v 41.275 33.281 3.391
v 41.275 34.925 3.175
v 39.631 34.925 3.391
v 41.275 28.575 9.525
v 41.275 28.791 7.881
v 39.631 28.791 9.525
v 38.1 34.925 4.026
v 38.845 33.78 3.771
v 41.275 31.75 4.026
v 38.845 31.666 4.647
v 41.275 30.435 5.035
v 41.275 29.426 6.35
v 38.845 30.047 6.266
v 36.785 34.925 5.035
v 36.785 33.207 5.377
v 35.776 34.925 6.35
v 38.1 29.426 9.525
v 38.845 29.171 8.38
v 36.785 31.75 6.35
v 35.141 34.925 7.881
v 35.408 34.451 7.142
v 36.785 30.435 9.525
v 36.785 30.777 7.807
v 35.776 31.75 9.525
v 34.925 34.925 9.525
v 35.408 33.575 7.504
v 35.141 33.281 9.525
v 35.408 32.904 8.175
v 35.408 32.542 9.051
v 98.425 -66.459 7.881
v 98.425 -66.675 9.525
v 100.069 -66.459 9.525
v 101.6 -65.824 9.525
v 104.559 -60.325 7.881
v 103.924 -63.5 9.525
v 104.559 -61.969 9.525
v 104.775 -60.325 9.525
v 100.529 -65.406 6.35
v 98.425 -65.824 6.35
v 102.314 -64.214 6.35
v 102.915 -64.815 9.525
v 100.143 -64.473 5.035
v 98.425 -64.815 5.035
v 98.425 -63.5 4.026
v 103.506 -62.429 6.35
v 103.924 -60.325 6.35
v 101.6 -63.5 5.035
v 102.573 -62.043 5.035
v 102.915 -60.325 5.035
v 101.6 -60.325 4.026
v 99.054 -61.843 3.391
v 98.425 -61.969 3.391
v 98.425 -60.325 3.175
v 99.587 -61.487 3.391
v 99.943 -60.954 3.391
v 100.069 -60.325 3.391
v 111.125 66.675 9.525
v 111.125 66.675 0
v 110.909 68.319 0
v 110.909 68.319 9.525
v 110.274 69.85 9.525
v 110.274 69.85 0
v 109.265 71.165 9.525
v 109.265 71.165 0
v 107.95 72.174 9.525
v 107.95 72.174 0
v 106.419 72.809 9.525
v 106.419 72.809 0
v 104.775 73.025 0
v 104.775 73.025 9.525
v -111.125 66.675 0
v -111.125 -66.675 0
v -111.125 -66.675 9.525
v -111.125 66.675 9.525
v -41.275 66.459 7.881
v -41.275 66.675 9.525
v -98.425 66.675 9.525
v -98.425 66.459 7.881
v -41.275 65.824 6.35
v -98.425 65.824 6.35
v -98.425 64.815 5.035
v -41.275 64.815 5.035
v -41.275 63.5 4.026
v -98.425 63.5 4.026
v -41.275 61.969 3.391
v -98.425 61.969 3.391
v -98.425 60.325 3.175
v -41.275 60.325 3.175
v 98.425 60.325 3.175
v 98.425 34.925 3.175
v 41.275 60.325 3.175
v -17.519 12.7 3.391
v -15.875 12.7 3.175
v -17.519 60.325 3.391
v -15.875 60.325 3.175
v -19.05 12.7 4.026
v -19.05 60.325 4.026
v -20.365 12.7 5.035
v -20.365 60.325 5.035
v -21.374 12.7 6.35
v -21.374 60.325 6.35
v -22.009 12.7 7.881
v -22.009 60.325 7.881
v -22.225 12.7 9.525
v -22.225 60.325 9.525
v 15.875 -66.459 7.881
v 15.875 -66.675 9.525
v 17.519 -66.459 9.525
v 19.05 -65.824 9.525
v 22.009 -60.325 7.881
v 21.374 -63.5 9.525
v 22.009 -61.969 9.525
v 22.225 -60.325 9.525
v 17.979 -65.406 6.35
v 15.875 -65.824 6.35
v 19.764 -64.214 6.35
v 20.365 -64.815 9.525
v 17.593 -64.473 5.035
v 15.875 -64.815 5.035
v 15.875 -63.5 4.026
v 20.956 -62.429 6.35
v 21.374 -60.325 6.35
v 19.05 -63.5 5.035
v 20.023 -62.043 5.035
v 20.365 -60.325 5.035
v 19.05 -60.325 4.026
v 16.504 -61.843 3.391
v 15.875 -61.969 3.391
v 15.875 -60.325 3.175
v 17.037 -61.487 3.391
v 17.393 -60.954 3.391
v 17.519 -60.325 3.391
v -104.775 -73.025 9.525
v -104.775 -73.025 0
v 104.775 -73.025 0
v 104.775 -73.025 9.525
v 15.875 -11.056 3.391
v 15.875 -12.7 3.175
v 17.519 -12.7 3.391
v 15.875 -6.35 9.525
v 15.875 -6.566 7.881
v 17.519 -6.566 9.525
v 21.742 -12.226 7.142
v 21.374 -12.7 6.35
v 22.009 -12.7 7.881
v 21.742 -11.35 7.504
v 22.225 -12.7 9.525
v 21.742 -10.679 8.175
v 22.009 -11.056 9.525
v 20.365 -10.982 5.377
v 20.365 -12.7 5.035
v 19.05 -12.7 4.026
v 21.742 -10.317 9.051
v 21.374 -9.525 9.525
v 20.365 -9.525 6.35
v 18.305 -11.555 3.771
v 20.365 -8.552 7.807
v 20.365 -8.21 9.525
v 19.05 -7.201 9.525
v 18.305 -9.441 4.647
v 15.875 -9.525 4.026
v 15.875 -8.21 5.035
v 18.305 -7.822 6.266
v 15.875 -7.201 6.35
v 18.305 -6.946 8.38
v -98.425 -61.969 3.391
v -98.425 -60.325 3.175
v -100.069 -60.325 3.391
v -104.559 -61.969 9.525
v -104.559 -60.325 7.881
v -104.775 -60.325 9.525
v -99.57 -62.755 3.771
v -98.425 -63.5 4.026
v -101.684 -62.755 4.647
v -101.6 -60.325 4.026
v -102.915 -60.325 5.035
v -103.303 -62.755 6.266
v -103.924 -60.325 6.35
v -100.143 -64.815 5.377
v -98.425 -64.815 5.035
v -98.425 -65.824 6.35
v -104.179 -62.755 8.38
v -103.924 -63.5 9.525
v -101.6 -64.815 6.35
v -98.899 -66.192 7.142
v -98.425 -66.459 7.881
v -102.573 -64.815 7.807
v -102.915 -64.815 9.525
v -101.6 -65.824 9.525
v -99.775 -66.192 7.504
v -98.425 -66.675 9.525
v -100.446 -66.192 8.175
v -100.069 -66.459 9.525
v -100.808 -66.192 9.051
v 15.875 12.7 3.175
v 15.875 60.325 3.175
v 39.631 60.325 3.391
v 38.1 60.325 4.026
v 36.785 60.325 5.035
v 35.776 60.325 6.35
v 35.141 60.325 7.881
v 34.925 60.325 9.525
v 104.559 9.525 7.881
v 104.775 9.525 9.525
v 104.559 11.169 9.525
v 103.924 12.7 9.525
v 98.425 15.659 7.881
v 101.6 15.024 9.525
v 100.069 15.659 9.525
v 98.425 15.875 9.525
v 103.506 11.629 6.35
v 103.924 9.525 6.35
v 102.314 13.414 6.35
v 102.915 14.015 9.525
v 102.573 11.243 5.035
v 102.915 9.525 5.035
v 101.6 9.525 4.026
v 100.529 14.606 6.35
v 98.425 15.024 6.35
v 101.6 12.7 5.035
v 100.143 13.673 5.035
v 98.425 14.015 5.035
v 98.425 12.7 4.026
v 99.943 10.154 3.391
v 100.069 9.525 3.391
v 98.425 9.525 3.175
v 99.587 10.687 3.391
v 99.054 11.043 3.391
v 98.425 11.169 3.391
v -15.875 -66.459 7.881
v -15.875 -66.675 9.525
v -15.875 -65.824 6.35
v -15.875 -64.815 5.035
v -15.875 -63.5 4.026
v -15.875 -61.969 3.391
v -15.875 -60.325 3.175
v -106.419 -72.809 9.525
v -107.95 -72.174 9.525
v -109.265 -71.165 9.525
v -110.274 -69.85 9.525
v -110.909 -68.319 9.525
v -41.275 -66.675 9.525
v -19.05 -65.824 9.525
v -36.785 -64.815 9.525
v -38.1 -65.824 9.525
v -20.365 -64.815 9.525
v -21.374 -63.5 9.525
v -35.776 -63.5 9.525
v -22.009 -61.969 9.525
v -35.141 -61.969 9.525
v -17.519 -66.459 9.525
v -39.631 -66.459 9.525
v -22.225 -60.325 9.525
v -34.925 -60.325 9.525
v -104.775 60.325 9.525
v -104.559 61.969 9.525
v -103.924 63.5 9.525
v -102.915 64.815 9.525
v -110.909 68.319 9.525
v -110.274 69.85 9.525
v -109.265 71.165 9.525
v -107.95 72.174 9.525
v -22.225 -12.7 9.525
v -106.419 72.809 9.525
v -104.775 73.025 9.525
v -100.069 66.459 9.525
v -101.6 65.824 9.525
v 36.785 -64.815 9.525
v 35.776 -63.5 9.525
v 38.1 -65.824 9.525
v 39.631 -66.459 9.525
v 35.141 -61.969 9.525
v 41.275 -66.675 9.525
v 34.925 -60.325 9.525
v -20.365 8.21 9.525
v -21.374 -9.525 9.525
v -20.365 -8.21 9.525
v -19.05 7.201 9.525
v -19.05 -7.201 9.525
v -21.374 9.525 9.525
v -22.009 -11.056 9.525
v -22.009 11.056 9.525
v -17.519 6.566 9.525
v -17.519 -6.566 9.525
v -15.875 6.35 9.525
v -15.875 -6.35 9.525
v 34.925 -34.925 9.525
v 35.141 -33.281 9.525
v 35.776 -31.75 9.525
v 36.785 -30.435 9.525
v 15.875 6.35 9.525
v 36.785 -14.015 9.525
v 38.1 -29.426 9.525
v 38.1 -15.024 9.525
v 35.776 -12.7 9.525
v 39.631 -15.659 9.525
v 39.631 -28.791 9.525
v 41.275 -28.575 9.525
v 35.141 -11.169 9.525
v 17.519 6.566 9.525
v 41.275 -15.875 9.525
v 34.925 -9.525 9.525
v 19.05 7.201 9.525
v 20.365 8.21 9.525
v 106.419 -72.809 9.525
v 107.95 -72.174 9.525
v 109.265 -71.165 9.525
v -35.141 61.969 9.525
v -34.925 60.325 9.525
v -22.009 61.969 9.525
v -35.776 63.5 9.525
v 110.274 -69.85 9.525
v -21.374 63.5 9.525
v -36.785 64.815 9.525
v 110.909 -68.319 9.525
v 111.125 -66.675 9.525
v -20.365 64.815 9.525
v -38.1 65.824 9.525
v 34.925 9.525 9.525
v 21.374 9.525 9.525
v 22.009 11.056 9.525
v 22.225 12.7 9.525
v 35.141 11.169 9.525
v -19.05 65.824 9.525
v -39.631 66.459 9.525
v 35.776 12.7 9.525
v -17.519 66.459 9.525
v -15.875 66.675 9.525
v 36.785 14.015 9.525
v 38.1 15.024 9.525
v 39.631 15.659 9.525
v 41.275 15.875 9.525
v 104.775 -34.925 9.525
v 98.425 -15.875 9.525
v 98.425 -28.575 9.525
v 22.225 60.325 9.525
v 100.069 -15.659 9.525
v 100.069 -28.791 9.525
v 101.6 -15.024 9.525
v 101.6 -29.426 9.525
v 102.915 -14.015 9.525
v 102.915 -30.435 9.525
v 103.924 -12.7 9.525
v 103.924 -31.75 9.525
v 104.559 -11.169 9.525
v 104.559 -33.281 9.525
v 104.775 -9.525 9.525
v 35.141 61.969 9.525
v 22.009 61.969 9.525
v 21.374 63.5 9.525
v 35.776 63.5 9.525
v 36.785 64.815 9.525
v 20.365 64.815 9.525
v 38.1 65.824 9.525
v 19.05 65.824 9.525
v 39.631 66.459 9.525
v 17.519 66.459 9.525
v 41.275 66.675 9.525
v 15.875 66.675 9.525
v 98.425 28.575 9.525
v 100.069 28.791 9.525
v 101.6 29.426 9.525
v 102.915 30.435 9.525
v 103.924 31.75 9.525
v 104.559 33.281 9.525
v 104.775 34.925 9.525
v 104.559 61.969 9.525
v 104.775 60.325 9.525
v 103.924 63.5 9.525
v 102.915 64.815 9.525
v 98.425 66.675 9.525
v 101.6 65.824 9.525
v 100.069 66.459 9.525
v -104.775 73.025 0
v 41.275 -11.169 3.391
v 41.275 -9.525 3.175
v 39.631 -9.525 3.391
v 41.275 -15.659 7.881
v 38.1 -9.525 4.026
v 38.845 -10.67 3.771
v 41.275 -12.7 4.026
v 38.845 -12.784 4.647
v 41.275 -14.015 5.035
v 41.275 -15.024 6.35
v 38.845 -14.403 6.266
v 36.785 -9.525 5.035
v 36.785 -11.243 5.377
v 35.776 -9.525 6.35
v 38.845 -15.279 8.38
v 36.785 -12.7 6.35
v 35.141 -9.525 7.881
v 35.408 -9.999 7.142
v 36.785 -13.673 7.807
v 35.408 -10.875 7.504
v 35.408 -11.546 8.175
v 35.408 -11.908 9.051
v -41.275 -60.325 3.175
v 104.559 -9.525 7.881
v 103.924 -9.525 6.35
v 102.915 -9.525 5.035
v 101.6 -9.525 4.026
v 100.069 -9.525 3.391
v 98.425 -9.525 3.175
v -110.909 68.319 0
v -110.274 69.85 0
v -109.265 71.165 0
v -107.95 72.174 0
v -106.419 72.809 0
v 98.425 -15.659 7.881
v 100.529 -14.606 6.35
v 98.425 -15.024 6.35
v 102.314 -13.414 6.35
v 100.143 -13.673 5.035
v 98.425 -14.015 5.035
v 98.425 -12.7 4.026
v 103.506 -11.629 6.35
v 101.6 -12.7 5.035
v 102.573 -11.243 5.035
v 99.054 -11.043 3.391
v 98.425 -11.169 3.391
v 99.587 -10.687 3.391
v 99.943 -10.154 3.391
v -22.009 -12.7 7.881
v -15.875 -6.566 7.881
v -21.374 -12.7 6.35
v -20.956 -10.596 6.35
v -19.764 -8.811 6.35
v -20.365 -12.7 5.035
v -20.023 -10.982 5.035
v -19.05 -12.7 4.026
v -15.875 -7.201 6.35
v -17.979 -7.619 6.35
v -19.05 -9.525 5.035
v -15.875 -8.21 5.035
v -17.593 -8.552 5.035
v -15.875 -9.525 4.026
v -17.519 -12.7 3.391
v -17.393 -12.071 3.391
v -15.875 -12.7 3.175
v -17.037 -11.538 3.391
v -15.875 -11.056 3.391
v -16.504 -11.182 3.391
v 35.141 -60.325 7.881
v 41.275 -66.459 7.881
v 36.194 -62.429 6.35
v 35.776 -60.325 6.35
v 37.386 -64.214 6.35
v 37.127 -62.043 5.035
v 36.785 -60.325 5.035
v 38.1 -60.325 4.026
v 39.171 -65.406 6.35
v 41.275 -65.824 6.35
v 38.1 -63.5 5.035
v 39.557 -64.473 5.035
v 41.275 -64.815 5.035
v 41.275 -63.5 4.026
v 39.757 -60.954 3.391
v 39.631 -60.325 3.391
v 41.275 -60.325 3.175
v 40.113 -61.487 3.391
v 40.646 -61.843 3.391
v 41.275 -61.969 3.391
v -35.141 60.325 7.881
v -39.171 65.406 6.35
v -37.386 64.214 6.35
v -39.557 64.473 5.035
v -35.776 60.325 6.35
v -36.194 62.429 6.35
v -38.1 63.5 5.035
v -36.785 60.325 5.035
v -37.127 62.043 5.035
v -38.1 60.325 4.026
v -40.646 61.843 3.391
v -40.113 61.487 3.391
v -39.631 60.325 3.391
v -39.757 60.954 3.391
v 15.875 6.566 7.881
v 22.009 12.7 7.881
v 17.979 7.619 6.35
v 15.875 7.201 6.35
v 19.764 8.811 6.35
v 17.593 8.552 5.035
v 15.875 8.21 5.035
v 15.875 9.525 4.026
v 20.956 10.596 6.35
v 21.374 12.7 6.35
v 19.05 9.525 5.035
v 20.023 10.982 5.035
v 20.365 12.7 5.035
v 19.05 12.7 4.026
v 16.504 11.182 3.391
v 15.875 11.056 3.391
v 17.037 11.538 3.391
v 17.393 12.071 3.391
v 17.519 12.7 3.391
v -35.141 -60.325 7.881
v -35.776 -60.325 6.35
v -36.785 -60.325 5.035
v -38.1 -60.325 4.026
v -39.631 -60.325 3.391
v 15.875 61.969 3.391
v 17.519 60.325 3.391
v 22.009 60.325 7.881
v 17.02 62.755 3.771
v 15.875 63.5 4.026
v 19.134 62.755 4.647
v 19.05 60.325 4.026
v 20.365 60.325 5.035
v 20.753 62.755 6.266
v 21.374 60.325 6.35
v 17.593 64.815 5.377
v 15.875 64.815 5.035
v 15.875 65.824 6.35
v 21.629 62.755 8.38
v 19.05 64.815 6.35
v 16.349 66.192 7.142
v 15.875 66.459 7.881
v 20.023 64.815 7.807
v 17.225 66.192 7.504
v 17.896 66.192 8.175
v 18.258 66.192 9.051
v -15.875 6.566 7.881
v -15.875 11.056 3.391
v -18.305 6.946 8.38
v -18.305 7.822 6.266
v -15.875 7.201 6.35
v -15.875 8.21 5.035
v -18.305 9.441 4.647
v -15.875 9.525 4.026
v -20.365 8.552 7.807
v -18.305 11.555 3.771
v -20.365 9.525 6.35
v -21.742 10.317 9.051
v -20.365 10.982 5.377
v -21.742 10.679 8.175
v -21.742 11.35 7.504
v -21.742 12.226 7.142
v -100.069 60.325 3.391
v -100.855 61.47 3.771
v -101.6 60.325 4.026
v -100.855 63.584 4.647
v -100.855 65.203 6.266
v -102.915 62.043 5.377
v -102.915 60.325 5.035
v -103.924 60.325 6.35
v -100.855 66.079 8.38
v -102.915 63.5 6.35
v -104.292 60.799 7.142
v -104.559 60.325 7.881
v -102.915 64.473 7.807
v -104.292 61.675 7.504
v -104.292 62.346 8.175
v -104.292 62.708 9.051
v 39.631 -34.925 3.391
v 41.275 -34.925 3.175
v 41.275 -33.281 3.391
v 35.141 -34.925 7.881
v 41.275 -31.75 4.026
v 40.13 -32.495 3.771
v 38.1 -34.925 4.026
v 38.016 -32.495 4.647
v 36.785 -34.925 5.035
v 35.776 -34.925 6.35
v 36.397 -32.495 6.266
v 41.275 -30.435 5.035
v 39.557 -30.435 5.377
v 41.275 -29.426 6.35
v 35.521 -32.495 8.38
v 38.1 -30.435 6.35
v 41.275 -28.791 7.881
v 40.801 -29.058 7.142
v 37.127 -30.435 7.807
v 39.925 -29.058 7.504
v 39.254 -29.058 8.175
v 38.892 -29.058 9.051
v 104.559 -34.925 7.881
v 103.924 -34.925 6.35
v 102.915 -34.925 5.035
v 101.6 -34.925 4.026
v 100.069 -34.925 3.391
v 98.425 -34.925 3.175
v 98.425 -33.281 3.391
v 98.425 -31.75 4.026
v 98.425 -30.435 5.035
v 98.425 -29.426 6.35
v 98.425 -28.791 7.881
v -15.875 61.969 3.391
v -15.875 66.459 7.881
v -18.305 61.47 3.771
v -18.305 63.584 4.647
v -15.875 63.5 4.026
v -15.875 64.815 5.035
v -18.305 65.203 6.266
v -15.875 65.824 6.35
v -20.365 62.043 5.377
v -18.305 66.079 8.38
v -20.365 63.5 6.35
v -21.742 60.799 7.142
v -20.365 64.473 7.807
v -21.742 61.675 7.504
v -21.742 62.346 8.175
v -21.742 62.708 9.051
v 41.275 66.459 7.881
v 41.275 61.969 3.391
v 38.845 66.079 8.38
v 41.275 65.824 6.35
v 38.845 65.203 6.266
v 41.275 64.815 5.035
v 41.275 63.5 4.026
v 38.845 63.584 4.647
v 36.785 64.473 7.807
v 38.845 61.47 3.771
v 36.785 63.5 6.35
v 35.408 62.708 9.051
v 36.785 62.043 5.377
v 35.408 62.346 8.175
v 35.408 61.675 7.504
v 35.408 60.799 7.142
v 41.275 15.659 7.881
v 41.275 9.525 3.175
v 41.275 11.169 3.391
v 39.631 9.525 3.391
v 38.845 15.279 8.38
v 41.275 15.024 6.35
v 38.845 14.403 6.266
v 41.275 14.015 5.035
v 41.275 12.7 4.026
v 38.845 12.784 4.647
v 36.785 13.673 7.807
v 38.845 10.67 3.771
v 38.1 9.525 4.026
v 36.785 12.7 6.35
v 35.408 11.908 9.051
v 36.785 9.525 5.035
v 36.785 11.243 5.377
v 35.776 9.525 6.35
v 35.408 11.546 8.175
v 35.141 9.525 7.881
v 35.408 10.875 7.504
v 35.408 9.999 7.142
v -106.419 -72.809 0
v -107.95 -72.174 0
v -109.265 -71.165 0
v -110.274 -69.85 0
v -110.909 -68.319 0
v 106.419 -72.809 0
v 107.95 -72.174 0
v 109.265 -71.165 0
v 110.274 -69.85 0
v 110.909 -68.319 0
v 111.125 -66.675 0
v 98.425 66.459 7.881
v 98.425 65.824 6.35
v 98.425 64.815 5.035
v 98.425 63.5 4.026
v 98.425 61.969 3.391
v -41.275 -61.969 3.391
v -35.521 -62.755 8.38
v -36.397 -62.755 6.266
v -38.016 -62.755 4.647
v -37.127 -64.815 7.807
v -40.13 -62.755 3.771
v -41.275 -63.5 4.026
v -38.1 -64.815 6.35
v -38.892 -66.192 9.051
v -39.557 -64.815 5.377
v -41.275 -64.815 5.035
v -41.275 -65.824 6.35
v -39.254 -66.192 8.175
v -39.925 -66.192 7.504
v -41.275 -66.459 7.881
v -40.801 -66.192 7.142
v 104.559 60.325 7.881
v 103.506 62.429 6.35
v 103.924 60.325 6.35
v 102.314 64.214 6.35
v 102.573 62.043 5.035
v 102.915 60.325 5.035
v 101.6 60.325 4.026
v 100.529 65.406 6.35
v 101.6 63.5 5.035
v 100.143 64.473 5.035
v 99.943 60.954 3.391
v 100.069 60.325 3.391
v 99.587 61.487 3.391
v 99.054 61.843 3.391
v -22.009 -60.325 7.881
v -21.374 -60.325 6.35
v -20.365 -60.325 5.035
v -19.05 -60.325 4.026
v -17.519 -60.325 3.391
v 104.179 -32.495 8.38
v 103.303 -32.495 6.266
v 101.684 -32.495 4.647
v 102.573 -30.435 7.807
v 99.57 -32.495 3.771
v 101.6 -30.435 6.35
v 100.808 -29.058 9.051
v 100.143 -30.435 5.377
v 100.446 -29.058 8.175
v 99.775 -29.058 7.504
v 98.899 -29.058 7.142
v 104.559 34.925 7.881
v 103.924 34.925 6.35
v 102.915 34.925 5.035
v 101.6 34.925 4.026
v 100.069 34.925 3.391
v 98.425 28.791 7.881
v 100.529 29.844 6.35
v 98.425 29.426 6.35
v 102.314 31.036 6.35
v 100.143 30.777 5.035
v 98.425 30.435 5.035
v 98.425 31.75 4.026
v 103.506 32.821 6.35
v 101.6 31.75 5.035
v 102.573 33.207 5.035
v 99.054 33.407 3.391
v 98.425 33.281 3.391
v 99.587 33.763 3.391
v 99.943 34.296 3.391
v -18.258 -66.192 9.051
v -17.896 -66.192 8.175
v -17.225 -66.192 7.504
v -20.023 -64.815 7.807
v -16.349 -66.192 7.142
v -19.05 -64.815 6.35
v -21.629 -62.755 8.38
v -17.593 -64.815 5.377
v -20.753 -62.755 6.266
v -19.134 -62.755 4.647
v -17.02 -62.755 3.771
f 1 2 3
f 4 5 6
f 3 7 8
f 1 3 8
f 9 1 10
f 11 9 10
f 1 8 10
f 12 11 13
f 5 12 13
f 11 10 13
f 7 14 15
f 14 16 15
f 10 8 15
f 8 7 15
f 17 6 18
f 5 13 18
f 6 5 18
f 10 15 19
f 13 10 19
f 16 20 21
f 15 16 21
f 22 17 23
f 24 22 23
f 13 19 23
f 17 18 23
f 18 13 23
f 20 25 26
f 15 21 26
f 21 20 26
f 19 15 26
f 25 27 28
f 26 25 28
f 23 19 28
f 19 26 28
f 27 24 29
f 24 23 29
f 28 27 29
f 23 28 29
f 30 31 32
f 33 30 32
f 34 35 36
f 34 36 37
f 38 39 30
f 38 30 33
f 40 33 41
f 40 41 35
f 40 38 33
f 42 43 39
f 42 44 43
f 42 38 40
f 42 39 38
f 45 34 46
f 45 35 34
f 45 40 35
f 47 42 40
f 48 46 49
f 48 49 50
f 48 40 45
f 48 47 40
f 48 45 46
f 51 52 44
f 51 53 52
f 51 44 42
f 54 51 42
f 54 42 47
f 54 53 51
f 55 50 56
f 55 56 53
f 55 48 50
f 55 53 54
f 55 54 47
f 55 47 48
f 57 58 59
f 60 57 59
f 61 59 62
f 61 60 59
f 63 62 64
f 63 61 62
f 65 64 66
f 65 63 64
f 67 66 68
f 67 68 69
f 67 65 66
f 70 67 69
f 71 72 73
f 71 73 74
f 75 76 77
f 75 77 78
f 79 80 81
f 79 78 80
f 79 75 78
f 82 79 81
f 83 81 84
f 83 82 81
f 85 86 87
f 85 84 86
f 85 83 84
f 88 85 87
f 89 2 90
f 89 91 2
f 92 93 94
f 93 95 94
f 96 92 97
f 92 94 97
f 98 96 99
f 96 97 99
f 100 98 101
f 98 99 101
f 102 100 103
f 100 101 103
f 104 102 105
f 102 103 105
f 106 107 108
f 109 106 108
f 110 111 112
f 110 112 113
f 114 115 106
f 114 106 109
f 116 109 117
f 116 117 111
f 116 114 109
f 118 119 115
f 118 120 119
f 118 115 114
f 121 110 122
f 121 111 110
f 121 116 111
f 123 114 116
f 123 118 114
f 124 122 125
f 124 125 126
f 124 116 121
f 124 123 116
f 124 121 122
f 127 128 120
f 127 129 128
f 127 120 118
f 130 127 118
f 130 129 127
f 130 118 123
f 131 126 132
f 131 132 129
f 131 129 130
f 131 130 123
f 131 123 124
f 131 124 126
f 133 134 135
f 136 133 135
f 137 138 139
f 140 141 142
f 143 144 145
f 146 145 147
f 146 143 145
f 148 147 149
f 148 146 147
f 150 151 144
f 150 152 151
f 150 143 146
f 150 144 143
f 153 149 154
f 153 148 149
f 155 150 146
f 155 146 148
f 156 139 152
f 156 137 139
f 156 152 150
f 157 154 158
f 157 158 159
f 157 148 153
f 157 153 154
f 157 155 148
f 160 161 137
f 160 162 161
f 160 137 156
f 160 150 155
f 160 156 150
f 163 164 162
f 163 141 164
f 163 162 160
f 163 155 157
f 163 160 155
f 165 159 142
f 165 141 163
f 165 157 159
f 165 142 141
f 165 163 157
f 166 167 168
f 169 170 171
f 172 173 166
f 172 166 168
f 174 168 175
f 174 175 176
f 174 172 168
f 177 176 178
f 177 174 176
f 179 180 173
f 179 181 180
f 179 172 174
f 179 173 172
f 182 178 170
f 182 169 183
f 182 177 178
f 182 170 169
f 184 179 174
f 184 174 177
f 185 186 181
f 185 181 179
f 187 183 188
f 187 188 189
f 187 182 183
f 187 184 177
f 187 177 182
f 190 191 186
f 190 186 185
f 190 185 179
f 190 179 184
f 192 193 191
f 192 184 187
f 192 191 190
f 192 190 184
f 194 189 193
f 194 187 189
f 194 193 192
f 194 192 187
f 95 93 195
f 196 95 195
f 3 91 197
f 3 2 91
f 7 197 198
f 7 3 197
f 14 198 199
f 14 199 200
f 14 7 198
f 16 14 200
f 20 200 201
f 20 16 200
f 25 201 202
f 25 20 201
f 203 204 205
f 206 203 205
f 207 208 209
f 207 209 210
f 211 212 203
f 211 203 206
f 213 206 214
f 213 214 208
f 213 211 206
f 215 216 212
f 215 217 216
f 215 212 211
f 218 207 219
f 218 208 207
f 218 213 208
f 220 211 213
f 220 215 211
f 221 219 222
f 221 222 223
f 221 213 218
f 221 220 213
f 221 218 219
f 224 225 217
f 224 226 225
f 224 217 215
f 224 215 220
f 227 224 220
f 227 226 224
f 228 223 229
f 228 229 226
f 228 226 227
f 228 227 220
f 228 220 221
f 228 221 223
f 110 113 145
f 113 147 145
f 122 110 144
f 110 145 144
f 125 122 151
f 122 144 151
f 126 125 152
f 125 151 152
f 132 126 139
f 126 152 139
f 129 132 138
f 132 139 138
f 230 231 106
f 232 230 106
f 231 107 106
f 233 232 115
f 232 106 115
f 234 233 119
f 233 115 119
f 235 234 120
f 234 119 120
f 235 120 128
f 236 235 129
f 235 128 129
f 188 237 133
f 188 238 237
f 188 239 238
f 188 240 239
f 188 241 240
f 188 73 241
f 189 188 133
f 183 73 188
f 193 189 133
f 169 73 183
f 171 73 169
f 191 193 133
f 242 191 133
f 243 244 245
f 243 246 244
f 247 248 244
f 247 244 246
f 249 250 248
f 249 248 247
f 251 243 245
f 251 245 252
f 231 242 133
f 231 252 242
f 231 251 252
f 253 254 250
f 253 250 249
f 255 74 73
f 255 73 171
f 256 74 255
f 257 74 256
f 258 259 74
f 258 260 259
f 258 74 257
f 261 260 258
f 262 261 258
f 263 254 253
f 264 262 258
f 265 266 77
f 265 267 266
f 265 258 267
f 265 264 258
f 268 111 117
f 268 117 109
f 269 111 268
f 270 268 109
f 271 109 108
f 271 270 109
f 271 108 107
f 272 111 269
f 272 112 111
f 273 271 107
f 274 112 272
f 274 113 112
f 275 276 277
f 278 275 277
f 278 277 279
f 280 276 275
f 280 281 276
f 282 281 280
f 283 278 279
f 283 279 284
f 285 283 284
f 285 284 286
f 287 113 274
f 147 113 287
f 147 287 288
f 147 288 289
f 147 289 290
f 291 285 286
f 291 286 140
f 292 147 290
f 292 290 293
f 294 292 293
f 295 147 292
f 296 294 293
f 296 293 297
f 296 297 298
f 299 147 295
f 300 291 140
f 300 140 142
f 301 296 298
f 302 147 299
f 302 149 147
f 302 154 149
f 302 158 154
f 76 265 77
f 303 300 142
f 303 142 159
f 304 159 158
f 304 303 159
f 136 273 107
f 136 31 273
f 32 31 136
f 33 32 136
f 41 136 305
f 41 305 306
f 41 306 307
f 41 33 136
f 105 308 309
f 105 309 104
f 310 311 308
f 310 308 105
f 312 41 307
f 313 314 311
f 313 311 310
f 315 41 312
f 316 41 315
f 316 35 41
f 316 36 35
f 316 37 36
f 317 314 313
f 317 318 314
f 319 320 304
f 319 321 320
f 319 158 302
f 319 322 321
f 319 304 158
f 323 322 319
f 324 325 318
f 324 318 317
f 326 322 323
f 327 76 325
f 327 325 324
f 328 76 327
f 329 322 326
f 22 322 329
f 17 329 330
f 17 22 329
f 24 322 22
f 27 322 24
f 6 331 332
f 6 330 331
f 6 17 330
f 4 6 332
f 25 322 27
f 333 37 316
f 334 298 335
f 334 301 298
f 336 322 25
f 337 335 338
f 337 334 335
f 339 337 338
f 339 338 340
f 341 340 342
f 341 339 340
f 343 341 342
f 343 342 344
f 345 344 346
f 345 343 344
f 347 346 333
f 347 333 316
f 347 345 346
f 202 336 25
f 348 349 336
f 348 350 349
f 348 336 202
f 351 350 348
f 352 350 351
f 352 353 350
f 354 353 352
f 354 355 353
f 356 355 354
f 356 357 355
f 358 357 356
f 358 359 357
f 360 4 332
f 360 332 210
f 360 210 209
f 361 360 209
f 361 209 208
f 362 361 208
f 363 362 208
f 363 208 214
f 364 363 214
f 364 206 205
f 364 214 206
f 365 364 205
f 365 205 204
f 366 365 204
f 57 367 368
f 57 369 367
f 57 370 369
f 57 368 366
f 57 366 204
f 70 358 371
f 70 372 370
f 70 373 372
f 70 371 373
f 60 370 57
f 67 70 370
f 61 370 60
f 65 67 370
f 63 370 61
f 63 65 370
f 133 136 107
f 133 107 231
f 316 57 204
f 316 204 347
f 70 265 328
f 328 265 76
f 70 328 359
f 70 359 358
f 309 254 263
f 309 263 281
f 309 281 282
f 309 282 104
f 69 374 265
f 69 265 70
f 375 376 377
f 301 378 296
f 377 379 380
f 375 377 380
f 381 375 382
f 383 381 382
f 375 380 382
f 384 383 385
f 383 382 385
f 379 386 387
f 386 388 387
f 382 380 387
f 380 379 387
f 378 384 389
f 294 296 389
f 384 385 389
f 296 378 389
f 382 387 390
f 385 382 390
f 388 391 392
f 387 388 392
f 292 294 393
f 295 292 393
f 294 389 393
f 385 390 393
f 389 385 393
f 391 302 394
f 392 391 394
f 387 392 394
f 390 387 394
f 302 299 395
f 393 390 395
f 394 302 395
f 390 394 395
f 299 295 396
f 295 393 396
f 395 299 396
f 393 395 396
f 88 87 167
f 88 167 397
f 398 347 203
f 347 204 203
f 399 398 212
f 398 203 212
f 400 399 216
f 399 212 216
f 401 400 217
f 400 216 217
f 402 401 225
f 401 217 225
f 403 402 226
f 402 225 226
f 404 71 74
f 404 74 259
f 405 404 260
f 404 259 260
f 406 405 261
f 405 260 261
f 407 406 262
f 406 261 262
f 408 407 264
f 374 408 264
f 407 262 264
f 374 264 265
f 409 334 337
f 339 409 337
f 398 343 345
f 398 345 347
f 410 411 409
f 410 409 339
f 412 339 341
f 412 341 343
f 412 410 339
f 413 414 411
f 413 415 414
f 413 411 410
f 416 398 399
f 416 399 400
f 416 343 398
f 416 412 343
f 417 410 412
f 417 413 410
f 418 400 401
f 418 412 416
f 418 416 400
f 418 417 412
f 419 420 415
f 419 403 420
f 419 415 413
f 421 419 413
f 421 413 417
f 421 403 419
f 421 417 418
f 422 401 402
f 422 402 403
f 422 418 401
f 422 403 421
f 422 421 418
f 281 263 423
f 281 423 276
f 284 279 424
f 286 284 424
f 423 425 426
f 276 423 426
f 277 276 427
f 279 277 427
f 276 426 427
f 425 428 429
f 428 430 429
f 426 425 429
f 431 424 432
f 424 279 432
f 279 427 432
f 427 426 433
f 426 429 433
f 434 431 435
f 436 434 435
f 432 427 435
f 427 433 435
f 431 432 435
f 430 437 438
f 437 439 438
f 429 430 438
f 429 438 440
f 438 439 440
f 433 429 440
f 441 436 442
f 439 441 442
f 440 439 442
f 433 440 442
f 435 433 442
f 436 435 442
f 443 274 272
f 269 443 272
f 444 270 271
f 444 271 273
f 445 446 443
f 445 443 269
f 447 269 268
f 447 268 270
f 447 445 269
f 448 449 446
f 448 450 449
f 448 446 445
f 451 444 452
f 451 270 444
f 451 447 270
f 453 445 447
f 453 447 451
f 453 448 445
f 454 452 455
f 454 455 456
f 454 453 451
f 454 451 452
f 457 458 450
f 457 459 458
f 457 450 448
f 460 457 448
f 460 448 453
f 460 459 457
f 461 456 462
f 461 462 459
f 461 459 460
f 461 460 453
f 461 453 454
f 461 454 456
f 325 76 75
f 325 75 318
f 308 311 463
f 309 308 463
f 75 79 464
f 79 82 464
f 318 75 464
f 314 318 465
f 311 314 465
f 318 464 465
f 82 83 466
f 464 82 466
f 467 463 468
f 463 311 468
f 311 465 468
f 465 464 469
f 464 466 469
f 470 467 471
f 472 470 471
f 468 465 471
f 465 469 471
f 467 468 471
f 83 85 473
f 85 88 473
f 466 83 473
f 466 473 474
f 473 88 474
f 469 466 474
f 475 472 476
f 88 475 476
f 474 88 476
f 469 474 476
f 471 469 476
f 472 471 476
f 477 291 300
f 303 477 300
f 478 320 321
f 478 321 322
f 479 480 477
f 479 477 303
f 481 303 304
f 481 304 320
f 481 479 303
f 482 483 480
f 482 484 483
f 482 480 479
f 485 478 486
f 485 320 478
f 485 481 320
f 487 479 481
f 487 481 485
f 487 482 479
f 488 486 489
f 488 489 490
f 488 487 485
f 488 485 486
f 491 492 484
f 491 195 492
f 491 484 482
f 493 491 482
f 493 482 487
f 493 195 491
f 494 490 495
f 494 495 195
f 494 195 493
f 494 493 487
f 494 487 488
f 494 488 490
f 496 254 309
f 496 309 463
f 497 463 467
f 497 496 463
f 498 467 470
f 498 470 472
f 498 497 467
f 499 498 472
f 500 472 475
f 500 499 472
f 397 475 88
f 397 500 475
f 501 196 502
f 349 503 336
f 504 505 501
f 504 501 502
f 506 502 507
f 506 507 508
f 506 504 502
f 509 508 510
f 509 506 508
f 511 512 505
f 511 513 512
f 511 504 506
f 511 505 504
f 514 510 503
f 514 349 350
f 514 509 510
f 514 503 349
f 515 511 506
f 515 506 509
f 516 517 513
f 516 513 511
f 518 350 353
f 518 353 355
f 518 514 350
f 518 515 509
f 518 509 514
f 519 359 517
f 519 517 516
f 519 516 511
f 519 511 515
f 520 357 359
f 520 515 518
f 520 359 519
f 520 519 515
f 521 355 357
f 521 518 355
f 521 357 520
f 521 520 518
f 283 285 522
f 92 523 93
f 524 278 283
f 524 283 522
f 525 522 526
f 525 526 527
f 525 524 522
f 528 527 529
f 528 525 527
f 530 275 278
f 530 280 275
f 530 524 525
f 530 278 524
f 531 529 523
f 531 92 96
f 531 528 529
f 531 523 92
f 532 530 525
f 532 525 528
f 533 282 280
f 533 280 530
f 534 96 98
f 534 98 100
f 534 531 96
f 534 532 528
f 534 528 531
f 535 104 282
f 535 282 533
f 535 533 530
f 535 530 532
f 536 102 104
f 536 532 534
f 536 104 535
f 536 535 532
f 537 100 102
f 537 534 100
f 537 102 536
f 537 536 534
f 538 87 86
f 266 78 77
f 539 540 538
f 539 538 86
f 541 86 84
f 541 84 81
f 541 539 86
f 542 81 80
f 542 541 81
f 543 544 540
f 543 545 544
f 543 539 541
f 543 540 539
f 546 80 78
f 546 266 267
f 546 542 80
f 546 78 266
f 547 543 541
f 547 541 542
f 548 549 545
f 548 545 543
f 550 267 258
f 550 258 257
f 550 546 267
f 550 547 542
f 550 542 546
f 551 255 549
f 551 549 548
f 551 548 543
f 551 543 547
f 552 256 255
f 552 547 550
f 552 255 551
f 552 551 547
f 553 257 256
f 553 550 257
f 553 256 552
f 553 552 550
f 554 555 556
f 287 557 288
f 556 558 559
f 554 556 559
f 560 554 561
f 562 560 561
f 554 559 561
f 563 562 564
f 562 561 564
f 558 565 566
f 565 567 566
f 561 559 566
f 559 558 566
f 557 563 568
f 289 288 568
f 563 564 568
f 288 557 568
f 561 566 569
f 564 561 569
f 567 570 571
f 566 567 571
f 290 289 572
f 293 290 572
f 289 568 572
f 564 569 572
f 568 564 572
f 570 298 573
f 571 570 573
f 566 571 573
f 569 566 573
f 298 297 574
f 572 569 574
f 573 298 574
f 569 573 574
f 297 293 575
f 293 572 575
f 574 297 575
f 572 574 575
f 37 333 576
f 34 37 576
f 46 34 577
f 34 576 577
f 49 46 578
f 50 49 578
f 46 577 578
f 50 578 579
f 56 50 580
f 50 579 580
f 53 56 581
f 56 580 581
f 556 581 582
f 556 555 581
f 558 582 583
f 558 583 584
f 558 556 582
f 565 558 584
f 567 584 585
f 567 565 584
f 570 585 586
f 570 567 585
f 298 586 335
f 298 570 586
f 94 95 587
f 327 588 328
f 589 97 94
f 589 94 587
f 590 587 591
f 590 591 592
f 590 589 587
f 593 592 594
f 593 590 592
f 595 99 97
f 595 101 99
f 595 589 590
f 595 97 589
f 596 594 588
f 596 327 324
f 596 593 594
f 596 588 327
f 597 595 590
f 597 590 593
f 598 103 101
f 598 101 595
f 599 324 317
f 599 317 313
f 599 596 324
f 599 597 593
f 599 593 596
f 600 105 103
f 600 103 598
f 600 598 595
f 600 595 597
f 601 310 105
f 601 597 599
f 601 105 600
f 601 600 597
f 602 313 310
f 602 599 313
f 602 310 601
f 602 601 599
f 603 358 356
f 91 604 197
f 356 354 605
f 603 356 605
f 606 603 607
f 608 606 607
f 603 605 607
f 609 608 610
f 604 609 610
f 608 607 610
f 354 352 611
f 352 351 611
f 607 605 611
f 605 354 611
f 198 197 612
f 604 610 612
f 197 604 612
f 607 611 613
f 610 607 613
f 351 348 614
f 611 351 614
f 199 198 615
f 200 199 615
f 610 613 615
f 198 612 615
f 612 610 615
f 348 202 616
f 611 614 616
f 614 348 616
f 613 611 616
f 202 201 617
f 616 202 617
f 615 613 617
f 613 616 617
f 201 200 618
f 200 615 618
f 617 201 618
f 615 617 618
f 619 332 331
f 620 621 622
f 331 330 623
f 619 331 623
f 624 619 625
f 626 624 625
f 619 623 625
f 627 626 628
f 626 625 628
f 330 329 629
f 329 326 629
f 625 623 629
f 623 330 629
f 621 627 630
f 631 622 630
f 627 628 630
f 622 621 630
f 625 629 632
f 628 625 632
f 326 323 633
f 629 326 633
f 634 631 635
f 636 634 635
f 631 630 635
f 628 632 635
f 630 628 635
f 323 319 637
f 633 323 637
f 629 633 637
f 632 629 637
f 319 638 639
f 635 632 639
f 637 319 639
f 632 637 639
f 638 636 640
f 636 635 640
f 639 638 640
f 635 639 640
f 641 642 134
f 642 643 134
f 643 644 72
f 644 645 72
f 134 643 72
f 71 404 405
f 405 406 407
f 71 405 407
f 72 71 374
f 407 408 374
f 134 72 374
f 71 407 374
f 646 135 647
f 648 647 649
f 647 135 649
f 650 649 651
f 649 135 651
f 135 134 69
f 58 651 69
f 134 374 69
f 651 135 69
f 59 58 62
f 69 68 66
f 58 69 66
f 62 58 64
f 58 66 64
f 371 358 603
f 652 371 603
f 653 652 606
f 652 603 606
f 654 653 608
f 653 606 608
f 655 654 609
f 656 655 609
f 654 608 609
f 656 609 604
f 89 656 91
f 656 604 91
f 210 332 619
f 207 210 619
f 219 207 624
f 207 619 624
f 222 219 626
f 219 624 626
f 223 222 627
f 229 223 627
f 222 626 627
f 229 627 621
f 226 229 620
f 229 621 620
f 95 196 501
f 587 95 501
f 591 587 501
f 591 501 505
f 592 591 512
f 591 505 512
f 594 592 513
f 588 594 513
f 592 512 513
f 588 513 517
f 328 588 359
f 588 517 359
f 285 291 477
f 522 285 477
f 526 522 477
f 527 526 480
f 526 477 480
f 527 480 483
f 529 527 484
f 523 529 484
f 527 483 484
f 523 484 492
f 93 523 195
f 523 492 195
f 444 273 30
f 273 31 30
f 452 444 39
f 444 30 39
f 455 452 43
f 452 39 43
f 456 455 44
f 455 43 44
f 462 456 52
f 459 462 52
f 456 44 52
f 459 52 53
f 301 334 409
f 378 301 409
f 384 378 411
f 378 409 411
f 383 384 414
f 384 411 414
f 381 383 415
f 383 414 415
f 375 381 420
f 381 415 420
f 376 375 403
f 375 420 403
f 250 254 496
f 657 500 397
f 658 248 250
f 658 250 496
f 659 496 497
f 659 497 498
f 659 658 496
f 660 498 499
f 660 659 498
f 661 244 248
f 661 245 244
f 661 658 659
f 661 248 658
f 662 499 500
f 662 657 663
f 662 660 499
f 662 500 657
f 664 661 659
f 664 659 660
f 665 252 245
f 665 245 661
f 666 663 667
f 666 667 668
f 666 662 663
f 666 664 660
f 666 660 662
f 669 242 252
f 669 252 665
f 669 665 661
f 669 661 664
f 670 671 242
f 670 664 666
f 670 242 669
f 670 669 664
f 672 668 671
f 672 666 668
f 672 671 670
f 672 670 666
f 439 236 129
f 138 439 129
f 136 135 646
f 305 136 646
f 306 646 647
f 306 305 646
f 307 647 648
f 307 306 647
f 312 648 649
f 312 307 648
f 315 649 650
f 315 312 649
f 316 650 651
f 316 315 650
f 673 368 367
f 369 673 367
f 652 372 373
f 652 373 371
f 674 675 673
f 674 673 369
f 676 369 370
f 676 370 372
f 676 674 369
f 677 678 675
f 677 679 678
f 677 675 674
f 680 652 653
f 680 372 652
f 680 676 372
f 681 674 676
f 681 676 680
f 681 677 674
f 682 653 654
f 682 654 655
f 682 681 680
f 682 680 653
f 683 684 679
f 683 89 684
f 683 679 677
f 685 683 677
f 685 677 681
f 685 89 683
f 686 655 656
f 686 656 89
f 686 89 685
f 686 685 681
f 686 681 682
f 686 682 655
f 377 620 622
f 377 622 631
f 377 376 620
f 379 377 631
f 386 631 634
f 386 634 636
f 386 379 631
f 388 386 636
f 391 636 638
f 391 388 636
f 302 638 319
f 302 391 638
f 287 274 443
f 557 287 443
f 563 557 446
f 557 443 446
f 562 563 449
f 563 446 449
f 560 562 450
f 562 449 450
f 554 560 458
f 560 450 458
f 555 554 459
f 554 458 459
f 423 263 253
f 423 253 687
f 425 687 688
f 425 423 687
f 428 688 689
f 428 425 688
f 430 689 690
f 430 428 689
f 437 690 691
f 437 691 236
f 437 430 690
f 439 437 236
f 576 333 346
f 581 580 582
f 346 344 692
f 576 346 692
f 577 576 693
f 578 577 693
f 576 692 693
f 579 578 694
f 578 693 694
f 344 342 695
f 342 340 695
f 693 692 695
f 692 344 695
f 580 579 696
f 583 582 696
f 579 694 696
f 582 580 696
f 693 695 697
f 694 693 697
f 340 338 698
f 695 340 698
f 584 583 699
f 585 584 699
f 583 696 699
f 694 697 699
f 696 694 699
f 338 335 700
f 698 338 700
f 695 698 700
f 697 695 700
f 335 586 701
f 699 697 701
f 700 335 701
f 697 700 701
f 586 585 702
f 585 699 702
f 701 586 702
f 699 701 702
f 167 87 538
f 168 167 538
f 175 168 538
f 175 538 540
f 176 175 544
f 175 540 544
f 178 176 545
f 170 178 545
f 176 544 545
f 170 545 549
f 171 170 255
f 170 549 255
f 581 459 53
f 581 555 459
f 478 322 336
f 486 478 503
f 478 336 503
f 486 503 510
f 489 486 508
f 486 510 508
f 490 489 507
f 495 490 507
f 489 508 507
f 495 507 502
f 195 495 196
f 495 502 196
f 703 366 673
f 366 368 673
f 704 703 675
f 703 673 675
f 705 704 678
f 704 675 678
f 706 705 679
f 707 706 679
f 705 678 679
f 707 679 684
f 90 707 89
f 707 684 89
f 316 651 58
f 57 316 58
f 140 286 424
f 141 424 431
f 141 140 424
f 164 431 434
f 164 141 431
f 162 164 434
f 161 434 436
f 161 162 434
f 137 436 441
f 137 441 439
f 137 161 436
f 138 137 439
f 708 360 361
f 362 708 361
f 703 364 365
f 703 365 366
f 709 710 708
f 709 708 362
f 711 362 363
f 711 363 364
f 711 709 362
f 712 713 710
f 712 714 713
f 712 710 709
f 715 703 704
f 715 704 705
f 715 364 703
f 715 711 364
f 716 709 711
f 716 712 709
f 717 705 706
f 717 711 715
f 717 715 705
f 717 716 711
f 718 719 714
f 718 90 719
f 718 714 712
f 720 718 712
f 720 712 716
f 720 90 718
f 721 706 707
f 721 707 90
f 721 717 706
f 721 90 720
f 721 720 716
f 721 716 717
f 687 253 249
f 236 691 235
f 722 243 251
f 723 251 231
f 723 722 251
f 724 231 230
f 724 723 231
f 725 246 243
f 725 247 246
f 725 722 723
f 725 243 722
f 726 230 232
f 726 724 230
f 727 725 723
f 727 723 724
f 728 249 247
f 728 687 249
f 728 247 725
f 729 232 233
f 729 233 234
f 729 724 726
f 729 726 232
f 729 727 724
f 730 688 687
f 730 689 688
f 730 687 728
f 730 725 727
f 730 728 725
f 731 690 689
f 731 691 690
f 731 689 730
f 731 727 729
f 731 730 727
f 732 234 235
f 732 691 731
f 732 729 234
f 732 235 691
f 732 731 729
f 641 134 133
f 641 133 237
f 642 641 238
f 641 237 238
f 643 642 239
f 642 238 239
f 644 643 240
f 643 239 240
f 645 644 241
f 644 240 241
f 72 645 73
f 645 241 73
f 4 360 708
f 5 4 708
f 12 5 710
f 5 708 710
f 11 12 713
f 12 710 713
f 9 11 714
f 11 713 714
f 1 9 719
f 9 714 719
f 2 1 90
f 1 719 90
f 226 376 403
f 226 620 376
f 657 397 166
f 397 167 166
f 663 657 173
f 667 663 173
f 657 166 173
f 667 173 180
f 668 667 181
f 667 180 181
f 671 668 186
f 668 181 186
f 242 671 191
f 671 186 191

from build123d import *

# Parameters (mm, degrees)
F0_W     = 222.25
F0_H     = 146.05
F1_DEPTH = 9.525
F2_W     = 69.85
F2_H     = 38.1
F2_H_2   = 133.35
F2_H_3   = 31.75
F2_W_2   = 44.45
F2_H_4   = 60.325
F3_DEPTH = 6.35
F4_F1_R  = 6.35
F4_F2_R  = 6.35
F4_F3_R  = 6.35
F4_F4_R  = 6.35
F4_F5_R  = 6.35
F4_F6_R  = 6.3499
F4_F7_R  = 6.35
F4_F8_R  = 6.3499
F4_F9_R  = 6.35
F4_F10_R = 6.35
F4_F11_R = 6.3499
F4_F12_R = 6.3499
F4_F13_R = 6.35
F4_F14_R = 6.3499
F4_F15_R = 6.3499
F4_F16_R = 6.3499
F4_F17_R = 6.35
F4_F18_R = 6.35
F4_F19_R = 6.3499
F4_F20_R = 6.3499
F4_F21_R = 6.35
F4_F22_R = 6.3499
F4_F23_R = 6.3499
F4_F24_R = 6.3499
F4_F25_R = 6.35
F4_F26_R = 6.35
F4_F27_R = 6.3499
F4_F28_R = 6.3499


# Not quite as in the source:
# - two fillets or chamfers of one size are made in one step
# - a fillet or chamfer is up to 0.001 mm smaller than in the source, because OpenCascade refuses the exact size
# - a feature of the source that left no trace in its solid (it failed there, or was rolled back) is left out


with BuildPart() as f1:
    # F0 (on Top) → F1 (new body)
    with BuildSketch(Plane.XY):
        Rectangle(F0_W, F0_H)
    extrude(amount=F1_DEPTH)

    # F2 (on face) → F3 (cut)
    with BuildSketch(Plane.XY.offset(9.525)):
        with Locations((69.85, 47.625)):
            Rectangle(F2_W, F2_H)
        with Locations((69.85, -47.625)):
            Rectangle(F2_W, F2_H)
        with Locations((-69.85, 0)):
            Rectangle(F2_W, F2_H_2)
        with Locations((69.85, 0)):
            Rectangle(F2_W, F2_H_3)
        with Locations((0, -36.5125)):
            Rectangle(F2_W_2, F2_H_4)
        with Locations((0, 36.5125)):
            Rectangle(F2_W_2, F2_H_4)
    extrude(amount=-F3_DEPTH, mode=Mode.SUBTRACT)

    # F4: fillet of radius 6.35 on 46 edges, made by hand

    # F4_f1
    f4_f1_edges = [f1.edges().sort_by_distance(p)[0] for p in [
        (111.125, -73.025, 4.7625),
    ]]
    fillet(f4_f1_edges, radius=F4_F1_R)

    # F4_f2
    f4_f2_edges = [f1.edges().sort_by_distance(p)[0] for p in [
        (111.125, 73.025, 4.7625),
    ]]
    fillet(f4_f2_edges, radius=F4_F2_R)

    # F4_f3
    f4_f3_edges = [f1.edges().sort_by_distance(p)[0] for p in [
        (-111.125, -73.025, 4.7625),
    ]]
    fillet(f4_f3_edges, radius=F4_F3_R)

    # F4_f4
    f4_f4_edges = [f1.edges().sort_by_distance(p)[0] for p in [
        (-111.125, 73.025, 4.7625),
    ]]
    fillet(f4_f4_edges, radius=F4_F4_R)

    # F4_f5
    f4_f5_edges = [f1.edges().sort_by_distance(p)[0] for p in [
        (-22.225, -6.35, 6.35),
    ]]
    fillet(f4_f5_edges, radius=F4_F5_R)

    # F4_f6 (radius 6.35 in the source; OpenCascade refuses exactly that, so slightly less here)
    f4_f6_edges = [f1.edges().sort_by_distance(p)[0] for p in [
        (-22.225, -39.6875, 3.175),
    ]]
    fillet(f4_f6_edges, radius=F4_F6_R)

    # F4_f7
    f4_f7_edges = [f1.edges().sort_by_distance(p)[0] for p in [
        (22.225, -66.675, 6.35),
    ]]
    fillet(f4_f7_edges, radius=F4_F7_R)

    # F4_f8 (radius 6.35 in the source; OpenCascade refuses exactly that, so slightly less here)
    f4_f8_edges = [f1.edges().sort_by_distance(p)[0] for p in [
        (-5e-05, -66.675, 3.175),
    ]]
    fillet(f4_f8_edges, radius=F4_F8_R)

    # F4_f9
    f4_f9_edges = [f1.edges().sort_by_distance(p)[0] for p in [
        (34.925, -66.675, 6.35),
    ]]
    fillet(f4_f9_edges, radius=F4_F9_R)

    # F4_f10
    f4_f10_edges = [f1.edges().sort_by_distance(p)[0] for p in [
        (104.775, -66.675, 6.35),
    ]]
    fillet(f4_f10_edges, radius=F4_F10_R)

    # F4_f11 (radius 6.35 in the source; OpenCascade refuses exactly that, so slightly less here)
    f4_f11_edges = [f1.edges().sort_by_distance(p)[0] for p in [
        (69.85, -66.675, 3.175),
    ]]
    fillet(f4_f11_edges, radius=F4_F11_R)

    # F4_f12 (radius 6.35 in the source; OpenCascade refuses exactly that, so slightly less here)
    f4_f12_edges = [f1.edges().sort_by_distance(p)[0] for p in [
        (104.775, -28.575, 9.52495),
    ]]
    fillet(f4_f12_edges, radius=F4_F12_R)

    # F4_f13
    f4_f13_edges = [f1.edges().sort_by_distance(p)[0] for p in [
        (-34.925, 66.675, 6.35),
    ]]
    fillet(f4_f13_edges, radius=F4_F13_R)

    # F4_f14 (radius 6.35 in the source; OpenCascade refuses exactly that, so slightly less here)
    f4_f14_edges = [f1.edges().sort_by_distance(p)[0] for p in [
        (-73.025, 66.675, 3.175),
    ]]
    fillet(f4_f14_edges, radius=F4_F14_R)

    # F4_f15 (radius 6.35 in the source; OpenCascade refuses exactly that, so slightly less here)
    f4_f15_edges = [f1.edges().sort_by_distance(p)[0] for p in [
        (-104.775, -3.17495, 3.175),
    ]]
    fillet(f4_f15_edges, radius=F4_F15_R)

    # F4_f16 (radius 6.35 in the source; OpenCascade refuses exactly that, so slightly less here)
    f4_f16_edges = [f1.edges().sort_by_distance(p)[0] for p in [
        (-34.925, -66.675, 9.52495),
    ]]
    fillet(f4_f16_edges, radius=F4_F16_R)

    # F4_f17
    f4_f17_edges = [f1.edges().sort_by_distance(p)[0] for p in [
        (104.775, -15.875, 6.35),
    ]]
    fillet(f4_f17_edges, radius=F4_F17_R)

    # F4_f18
    f4_f18_edges = [f1.edges().sort_by_distance(p)[0] for p in [
        (104.775, 15.875, 6.35),
    ]]
    fillet(f4_f18_edges, radius=F4_F18_R)

    # F4_f19 (radius 6.35 in the source; OpenCascade refuses exactly that, so slightly less here)
    f4_f19_edges = [f1.edges().sort_by_distance(p)[0] for p in [
        (104.775, 0, 3.175),
    ]]
    fillet(f4_f19_edges, radius=F4_F19_R)

    # F4_f20 (radius 6.35 in the source; OpenCascade refuses exactly that, so slightly less here)
    f4_f20_edges = [f1.edges().sort_by_distance(p)[0] for p in [
        (34.925, 15.875, 9.52495),
    ]]
    fillet(f4_f20_edges, radius=F4_F20_R)

    # F4_f21
    f4_f21_edges = [f1.edges().sort_by_distance(p)[0] for p in [
        (22.225, 6.35, 6.35),
    ]]
    fillet(f4_f21_edges, radius=F4_F21_R)

    # F4_f22 (radius 6.35 in the source; OpenCascade refuses exactly that, so slightly less here)
    f4_f22_edges = [f1.edges().sort_by_distance(p)[0] for p in [
        (22.225, 39.6875, 3.175),
    ]]
    fillet(f4_f22_edges, radius=F4_F22_R)

    # F4_f23 (radius 6.35 in the source; OpenCascade refuses exactly that, so slightly less here)
    f4_f23_edges = [f1.edges().sort_by_distance(p)[0] for p in [
        (-3.17495, 66.675, 3.175),
    ]]
    fillet(f4_f23_edges, radius=F4_F23_R)

    # F4_f24 (radius 6.35 in the source; OpenCascade refuses exactly that, so slightly less here)
    f4_f24_edges = [f1.edges().sort_by_distance(p)[0] for p in [
        (-22.225, 6.35, 9.52495),
    ]]
    fillet(f4_f24_edges, radius=F4_F24_R)

    # F4_f25
    f4_f25_edges = [f1.edges().sort_by_distance(p)[0] for p in [
        (104.775, 28.575, 6.35),
    ]]
    fillet(f4_f25_edges, radius=F4_F25_R)

    # F4_f26
    f4_f26_edges = [f1.edges().sort_by_distance(p)[0] for p in [
        (104.775, 66.675, 6.35),
    ]]
    fillet(f4_f26_edges, radius=F4_F26_R)

    # F4_f27 (radius 6.35 in the source; OpenCascade refuses exactly that, so slightly less here)
    f4_f27_edges = [f1.edges().sort_by_distance(p)[0] for p in [
        (104.775, 47.625, 3.175),
    ]]
    fillet(f4_f27_edges, radius=F4_F27_R)

    # F4_f28 (radius 6.35 in the source; OpenCascade refuses exactly that, so slightly less here)
    f4_f28_edges = [f1.edges().sort_by_distance(p)[0] for p in [
        (34.925, 66.675, 9.52495),
    ]]
    fillet(f4_f28_edges, radius=F4_F28_R)


solid = f1.part
